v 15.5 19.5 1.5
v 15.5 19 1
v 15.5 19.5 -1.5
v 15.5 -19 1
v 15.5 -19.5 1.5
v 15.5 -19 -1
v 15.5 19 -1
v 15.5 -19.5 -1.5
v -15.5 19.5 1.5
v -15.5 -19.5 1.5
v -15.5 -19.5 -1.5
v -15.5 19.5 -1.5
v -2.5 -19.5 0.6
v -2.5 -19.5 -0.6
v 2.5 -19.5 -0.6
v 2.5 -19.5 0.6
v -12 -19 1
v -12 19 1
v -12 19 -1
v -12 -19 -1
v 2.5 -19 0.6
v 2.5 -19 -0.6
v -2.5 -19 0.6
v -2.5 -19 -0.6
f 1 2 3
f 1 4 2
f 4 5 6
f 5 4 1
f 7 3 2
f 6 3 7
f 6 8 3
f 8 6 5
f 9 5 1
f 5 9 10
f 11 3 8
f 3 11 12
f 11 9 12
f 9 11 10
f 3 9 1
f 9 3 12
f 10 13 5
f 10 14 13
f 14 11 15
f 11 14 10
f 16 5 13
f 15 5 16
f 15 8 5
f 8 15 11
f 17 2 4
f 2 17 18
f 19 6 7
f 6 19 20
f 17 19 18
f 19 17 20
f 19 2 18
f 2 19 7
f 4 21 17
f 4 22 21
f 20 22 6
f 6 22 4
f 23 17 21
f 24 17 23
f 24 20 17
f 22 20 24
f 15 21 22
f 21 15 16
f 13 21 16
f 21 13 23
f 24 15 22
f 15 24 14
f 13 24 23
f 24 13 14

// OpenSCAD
largura_esp = 30; 
profundidade_esp = 38;


difference() {
    cube([largura_esp + 1, profundidade_esp + 1, 3], center = true);
    translate([2,0,0]) cube([largura_esp - 2, 38, 2], center = true);
    translate([0,-20,0]) cube([5,5,1.2], center = true);
}
